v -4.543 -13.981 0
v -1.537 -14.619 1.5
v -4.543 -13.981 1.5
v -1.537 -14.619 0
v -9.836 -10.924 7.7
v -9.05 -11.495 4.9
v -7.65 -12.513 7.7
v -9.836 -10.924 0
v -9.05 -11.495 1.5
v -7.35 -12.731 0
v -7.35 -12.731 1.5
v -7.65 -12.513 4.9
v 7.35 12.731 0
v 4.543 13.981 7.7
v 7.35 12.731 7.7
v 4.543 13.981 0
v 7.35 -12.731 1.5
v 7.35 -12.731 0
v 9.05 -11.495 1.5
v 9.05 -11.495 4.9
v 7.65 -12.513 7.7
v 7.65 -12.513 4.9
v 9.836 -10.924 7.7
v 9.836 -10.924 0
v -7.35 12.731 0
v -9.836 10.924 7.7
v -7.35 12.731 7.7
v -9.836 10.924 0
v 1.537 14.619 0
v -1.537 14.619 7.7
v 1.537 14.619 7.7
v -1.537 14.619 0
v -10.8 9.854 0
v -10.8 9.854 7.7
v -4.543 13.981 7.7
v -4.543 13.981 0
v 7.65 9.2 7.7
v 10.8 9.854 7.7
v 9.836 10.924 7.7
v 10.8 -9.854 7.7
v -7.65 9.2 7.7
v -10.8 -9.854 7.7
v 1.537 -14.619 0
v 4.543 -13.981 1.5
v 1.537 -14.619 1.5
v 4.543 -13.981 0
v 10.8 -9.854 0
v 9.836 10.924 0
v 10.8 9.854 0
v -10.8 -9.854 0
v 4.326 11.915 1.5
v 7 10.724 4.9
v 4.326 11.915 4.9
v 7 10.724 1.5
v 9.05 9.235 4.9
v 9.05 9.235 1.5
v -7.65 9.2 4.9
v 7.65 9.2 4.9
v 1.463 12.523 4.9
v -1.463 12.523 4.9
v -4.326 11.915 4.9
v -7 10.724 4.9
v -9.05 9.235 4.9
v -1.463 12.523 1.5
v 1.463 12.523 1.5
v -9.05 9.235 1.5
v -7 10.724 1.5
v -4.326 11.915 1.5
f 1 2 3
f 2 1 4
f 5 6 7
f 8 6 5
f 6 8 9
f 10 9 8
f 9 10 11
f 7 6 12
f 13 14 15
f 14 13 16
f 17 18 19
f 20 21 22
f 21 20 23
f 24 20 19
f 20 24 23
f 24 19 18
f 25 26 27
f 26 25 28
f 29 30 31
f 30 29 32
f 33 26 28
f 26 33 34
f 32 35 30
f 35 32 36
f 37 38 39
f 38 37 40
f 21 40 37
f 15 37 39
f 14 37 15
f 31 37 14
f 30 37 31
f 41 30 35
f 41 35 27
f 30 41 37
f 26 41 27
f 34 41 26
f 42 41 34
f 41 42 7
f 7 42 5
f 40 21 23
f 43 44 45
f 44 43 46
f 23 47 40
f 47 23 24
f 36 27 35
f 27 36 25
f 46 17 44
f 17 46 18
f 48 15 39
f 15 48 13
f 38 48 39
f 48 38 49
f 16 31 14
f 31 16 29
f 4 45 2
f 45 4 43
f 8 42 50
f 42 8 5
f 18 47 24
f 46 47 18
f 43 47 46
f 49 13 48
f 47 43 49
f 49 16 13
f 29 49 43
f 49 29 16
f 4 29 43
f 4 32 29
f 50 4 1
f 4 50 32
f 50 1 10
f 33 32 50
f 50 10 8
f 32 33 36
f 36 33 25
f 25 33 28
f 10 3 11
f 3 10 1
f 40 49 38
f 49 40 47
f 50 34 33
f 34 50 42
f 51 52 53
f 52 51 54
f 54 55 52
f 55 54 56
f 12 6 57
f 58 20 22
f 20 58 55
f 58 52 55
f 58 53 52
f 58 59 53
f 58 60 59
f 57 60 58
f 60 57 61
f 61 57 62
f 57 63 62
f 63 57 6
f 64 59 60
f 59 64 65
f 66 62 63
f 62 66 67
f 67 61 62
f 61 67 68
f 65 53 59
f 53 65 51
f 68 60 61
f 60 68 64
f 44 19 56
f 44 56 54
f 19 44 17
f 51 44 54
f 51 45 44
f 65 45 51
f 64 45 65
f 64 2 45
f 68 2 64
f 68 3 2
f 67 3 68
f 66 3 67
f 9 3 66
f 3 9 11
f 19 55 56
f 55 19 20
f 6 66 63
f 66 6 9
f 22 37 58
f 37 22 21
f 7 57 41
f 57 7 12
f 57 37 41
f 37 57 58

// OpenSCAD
/* [Dimensions] */
base_thickness = 1.5;

foot_width = 21.6;
foot_length = 29.4;
foot_thickness = 7.7;

clamp_width = 18.1;
clamp_length = 28;
clamp_thickness = 3.4;

hole_width = 15.3;
hole_offset = -5.5;

/* [Hidden] */
hole_length = foot_length;
overlap = 0.001;

module foot_block() {
  intersection() {
    cylinder(d = foot_length, h = foot_thickness);
    translate([0, 0, foot_thickness / 2]) resize([foot_width, foot_length, foot_thickness]) cube(center = true);
  }
}

module clamp() {
    translate([0, -(foot_length - clamp_length), base_thickness]) {
        intersection() {
            cylinder(d = clamp_length, h = clamp_thickness);
            translate([0, 0, clamp_thickness / 2]) resize([clamp_width, foot_length, clamp_thickness]) cube(center = true);
        }
    }
}

module top_hole() {
  translate([0, hole_offset, -overlap + foot_thickness / 2 + base_thickness + clamp_thickness]) resize([hole_width, hole_length, foot_thickness]) 
    cube(center = true);
}

module foot() {
    difference() {
        foot_block();
        union() {
            clamp();
            top_hole();
        }
    }
}

//color("red", 1) foot_block();
//color("green", 1) clamp();
//color("blue", 1) top_hole();
foot();
